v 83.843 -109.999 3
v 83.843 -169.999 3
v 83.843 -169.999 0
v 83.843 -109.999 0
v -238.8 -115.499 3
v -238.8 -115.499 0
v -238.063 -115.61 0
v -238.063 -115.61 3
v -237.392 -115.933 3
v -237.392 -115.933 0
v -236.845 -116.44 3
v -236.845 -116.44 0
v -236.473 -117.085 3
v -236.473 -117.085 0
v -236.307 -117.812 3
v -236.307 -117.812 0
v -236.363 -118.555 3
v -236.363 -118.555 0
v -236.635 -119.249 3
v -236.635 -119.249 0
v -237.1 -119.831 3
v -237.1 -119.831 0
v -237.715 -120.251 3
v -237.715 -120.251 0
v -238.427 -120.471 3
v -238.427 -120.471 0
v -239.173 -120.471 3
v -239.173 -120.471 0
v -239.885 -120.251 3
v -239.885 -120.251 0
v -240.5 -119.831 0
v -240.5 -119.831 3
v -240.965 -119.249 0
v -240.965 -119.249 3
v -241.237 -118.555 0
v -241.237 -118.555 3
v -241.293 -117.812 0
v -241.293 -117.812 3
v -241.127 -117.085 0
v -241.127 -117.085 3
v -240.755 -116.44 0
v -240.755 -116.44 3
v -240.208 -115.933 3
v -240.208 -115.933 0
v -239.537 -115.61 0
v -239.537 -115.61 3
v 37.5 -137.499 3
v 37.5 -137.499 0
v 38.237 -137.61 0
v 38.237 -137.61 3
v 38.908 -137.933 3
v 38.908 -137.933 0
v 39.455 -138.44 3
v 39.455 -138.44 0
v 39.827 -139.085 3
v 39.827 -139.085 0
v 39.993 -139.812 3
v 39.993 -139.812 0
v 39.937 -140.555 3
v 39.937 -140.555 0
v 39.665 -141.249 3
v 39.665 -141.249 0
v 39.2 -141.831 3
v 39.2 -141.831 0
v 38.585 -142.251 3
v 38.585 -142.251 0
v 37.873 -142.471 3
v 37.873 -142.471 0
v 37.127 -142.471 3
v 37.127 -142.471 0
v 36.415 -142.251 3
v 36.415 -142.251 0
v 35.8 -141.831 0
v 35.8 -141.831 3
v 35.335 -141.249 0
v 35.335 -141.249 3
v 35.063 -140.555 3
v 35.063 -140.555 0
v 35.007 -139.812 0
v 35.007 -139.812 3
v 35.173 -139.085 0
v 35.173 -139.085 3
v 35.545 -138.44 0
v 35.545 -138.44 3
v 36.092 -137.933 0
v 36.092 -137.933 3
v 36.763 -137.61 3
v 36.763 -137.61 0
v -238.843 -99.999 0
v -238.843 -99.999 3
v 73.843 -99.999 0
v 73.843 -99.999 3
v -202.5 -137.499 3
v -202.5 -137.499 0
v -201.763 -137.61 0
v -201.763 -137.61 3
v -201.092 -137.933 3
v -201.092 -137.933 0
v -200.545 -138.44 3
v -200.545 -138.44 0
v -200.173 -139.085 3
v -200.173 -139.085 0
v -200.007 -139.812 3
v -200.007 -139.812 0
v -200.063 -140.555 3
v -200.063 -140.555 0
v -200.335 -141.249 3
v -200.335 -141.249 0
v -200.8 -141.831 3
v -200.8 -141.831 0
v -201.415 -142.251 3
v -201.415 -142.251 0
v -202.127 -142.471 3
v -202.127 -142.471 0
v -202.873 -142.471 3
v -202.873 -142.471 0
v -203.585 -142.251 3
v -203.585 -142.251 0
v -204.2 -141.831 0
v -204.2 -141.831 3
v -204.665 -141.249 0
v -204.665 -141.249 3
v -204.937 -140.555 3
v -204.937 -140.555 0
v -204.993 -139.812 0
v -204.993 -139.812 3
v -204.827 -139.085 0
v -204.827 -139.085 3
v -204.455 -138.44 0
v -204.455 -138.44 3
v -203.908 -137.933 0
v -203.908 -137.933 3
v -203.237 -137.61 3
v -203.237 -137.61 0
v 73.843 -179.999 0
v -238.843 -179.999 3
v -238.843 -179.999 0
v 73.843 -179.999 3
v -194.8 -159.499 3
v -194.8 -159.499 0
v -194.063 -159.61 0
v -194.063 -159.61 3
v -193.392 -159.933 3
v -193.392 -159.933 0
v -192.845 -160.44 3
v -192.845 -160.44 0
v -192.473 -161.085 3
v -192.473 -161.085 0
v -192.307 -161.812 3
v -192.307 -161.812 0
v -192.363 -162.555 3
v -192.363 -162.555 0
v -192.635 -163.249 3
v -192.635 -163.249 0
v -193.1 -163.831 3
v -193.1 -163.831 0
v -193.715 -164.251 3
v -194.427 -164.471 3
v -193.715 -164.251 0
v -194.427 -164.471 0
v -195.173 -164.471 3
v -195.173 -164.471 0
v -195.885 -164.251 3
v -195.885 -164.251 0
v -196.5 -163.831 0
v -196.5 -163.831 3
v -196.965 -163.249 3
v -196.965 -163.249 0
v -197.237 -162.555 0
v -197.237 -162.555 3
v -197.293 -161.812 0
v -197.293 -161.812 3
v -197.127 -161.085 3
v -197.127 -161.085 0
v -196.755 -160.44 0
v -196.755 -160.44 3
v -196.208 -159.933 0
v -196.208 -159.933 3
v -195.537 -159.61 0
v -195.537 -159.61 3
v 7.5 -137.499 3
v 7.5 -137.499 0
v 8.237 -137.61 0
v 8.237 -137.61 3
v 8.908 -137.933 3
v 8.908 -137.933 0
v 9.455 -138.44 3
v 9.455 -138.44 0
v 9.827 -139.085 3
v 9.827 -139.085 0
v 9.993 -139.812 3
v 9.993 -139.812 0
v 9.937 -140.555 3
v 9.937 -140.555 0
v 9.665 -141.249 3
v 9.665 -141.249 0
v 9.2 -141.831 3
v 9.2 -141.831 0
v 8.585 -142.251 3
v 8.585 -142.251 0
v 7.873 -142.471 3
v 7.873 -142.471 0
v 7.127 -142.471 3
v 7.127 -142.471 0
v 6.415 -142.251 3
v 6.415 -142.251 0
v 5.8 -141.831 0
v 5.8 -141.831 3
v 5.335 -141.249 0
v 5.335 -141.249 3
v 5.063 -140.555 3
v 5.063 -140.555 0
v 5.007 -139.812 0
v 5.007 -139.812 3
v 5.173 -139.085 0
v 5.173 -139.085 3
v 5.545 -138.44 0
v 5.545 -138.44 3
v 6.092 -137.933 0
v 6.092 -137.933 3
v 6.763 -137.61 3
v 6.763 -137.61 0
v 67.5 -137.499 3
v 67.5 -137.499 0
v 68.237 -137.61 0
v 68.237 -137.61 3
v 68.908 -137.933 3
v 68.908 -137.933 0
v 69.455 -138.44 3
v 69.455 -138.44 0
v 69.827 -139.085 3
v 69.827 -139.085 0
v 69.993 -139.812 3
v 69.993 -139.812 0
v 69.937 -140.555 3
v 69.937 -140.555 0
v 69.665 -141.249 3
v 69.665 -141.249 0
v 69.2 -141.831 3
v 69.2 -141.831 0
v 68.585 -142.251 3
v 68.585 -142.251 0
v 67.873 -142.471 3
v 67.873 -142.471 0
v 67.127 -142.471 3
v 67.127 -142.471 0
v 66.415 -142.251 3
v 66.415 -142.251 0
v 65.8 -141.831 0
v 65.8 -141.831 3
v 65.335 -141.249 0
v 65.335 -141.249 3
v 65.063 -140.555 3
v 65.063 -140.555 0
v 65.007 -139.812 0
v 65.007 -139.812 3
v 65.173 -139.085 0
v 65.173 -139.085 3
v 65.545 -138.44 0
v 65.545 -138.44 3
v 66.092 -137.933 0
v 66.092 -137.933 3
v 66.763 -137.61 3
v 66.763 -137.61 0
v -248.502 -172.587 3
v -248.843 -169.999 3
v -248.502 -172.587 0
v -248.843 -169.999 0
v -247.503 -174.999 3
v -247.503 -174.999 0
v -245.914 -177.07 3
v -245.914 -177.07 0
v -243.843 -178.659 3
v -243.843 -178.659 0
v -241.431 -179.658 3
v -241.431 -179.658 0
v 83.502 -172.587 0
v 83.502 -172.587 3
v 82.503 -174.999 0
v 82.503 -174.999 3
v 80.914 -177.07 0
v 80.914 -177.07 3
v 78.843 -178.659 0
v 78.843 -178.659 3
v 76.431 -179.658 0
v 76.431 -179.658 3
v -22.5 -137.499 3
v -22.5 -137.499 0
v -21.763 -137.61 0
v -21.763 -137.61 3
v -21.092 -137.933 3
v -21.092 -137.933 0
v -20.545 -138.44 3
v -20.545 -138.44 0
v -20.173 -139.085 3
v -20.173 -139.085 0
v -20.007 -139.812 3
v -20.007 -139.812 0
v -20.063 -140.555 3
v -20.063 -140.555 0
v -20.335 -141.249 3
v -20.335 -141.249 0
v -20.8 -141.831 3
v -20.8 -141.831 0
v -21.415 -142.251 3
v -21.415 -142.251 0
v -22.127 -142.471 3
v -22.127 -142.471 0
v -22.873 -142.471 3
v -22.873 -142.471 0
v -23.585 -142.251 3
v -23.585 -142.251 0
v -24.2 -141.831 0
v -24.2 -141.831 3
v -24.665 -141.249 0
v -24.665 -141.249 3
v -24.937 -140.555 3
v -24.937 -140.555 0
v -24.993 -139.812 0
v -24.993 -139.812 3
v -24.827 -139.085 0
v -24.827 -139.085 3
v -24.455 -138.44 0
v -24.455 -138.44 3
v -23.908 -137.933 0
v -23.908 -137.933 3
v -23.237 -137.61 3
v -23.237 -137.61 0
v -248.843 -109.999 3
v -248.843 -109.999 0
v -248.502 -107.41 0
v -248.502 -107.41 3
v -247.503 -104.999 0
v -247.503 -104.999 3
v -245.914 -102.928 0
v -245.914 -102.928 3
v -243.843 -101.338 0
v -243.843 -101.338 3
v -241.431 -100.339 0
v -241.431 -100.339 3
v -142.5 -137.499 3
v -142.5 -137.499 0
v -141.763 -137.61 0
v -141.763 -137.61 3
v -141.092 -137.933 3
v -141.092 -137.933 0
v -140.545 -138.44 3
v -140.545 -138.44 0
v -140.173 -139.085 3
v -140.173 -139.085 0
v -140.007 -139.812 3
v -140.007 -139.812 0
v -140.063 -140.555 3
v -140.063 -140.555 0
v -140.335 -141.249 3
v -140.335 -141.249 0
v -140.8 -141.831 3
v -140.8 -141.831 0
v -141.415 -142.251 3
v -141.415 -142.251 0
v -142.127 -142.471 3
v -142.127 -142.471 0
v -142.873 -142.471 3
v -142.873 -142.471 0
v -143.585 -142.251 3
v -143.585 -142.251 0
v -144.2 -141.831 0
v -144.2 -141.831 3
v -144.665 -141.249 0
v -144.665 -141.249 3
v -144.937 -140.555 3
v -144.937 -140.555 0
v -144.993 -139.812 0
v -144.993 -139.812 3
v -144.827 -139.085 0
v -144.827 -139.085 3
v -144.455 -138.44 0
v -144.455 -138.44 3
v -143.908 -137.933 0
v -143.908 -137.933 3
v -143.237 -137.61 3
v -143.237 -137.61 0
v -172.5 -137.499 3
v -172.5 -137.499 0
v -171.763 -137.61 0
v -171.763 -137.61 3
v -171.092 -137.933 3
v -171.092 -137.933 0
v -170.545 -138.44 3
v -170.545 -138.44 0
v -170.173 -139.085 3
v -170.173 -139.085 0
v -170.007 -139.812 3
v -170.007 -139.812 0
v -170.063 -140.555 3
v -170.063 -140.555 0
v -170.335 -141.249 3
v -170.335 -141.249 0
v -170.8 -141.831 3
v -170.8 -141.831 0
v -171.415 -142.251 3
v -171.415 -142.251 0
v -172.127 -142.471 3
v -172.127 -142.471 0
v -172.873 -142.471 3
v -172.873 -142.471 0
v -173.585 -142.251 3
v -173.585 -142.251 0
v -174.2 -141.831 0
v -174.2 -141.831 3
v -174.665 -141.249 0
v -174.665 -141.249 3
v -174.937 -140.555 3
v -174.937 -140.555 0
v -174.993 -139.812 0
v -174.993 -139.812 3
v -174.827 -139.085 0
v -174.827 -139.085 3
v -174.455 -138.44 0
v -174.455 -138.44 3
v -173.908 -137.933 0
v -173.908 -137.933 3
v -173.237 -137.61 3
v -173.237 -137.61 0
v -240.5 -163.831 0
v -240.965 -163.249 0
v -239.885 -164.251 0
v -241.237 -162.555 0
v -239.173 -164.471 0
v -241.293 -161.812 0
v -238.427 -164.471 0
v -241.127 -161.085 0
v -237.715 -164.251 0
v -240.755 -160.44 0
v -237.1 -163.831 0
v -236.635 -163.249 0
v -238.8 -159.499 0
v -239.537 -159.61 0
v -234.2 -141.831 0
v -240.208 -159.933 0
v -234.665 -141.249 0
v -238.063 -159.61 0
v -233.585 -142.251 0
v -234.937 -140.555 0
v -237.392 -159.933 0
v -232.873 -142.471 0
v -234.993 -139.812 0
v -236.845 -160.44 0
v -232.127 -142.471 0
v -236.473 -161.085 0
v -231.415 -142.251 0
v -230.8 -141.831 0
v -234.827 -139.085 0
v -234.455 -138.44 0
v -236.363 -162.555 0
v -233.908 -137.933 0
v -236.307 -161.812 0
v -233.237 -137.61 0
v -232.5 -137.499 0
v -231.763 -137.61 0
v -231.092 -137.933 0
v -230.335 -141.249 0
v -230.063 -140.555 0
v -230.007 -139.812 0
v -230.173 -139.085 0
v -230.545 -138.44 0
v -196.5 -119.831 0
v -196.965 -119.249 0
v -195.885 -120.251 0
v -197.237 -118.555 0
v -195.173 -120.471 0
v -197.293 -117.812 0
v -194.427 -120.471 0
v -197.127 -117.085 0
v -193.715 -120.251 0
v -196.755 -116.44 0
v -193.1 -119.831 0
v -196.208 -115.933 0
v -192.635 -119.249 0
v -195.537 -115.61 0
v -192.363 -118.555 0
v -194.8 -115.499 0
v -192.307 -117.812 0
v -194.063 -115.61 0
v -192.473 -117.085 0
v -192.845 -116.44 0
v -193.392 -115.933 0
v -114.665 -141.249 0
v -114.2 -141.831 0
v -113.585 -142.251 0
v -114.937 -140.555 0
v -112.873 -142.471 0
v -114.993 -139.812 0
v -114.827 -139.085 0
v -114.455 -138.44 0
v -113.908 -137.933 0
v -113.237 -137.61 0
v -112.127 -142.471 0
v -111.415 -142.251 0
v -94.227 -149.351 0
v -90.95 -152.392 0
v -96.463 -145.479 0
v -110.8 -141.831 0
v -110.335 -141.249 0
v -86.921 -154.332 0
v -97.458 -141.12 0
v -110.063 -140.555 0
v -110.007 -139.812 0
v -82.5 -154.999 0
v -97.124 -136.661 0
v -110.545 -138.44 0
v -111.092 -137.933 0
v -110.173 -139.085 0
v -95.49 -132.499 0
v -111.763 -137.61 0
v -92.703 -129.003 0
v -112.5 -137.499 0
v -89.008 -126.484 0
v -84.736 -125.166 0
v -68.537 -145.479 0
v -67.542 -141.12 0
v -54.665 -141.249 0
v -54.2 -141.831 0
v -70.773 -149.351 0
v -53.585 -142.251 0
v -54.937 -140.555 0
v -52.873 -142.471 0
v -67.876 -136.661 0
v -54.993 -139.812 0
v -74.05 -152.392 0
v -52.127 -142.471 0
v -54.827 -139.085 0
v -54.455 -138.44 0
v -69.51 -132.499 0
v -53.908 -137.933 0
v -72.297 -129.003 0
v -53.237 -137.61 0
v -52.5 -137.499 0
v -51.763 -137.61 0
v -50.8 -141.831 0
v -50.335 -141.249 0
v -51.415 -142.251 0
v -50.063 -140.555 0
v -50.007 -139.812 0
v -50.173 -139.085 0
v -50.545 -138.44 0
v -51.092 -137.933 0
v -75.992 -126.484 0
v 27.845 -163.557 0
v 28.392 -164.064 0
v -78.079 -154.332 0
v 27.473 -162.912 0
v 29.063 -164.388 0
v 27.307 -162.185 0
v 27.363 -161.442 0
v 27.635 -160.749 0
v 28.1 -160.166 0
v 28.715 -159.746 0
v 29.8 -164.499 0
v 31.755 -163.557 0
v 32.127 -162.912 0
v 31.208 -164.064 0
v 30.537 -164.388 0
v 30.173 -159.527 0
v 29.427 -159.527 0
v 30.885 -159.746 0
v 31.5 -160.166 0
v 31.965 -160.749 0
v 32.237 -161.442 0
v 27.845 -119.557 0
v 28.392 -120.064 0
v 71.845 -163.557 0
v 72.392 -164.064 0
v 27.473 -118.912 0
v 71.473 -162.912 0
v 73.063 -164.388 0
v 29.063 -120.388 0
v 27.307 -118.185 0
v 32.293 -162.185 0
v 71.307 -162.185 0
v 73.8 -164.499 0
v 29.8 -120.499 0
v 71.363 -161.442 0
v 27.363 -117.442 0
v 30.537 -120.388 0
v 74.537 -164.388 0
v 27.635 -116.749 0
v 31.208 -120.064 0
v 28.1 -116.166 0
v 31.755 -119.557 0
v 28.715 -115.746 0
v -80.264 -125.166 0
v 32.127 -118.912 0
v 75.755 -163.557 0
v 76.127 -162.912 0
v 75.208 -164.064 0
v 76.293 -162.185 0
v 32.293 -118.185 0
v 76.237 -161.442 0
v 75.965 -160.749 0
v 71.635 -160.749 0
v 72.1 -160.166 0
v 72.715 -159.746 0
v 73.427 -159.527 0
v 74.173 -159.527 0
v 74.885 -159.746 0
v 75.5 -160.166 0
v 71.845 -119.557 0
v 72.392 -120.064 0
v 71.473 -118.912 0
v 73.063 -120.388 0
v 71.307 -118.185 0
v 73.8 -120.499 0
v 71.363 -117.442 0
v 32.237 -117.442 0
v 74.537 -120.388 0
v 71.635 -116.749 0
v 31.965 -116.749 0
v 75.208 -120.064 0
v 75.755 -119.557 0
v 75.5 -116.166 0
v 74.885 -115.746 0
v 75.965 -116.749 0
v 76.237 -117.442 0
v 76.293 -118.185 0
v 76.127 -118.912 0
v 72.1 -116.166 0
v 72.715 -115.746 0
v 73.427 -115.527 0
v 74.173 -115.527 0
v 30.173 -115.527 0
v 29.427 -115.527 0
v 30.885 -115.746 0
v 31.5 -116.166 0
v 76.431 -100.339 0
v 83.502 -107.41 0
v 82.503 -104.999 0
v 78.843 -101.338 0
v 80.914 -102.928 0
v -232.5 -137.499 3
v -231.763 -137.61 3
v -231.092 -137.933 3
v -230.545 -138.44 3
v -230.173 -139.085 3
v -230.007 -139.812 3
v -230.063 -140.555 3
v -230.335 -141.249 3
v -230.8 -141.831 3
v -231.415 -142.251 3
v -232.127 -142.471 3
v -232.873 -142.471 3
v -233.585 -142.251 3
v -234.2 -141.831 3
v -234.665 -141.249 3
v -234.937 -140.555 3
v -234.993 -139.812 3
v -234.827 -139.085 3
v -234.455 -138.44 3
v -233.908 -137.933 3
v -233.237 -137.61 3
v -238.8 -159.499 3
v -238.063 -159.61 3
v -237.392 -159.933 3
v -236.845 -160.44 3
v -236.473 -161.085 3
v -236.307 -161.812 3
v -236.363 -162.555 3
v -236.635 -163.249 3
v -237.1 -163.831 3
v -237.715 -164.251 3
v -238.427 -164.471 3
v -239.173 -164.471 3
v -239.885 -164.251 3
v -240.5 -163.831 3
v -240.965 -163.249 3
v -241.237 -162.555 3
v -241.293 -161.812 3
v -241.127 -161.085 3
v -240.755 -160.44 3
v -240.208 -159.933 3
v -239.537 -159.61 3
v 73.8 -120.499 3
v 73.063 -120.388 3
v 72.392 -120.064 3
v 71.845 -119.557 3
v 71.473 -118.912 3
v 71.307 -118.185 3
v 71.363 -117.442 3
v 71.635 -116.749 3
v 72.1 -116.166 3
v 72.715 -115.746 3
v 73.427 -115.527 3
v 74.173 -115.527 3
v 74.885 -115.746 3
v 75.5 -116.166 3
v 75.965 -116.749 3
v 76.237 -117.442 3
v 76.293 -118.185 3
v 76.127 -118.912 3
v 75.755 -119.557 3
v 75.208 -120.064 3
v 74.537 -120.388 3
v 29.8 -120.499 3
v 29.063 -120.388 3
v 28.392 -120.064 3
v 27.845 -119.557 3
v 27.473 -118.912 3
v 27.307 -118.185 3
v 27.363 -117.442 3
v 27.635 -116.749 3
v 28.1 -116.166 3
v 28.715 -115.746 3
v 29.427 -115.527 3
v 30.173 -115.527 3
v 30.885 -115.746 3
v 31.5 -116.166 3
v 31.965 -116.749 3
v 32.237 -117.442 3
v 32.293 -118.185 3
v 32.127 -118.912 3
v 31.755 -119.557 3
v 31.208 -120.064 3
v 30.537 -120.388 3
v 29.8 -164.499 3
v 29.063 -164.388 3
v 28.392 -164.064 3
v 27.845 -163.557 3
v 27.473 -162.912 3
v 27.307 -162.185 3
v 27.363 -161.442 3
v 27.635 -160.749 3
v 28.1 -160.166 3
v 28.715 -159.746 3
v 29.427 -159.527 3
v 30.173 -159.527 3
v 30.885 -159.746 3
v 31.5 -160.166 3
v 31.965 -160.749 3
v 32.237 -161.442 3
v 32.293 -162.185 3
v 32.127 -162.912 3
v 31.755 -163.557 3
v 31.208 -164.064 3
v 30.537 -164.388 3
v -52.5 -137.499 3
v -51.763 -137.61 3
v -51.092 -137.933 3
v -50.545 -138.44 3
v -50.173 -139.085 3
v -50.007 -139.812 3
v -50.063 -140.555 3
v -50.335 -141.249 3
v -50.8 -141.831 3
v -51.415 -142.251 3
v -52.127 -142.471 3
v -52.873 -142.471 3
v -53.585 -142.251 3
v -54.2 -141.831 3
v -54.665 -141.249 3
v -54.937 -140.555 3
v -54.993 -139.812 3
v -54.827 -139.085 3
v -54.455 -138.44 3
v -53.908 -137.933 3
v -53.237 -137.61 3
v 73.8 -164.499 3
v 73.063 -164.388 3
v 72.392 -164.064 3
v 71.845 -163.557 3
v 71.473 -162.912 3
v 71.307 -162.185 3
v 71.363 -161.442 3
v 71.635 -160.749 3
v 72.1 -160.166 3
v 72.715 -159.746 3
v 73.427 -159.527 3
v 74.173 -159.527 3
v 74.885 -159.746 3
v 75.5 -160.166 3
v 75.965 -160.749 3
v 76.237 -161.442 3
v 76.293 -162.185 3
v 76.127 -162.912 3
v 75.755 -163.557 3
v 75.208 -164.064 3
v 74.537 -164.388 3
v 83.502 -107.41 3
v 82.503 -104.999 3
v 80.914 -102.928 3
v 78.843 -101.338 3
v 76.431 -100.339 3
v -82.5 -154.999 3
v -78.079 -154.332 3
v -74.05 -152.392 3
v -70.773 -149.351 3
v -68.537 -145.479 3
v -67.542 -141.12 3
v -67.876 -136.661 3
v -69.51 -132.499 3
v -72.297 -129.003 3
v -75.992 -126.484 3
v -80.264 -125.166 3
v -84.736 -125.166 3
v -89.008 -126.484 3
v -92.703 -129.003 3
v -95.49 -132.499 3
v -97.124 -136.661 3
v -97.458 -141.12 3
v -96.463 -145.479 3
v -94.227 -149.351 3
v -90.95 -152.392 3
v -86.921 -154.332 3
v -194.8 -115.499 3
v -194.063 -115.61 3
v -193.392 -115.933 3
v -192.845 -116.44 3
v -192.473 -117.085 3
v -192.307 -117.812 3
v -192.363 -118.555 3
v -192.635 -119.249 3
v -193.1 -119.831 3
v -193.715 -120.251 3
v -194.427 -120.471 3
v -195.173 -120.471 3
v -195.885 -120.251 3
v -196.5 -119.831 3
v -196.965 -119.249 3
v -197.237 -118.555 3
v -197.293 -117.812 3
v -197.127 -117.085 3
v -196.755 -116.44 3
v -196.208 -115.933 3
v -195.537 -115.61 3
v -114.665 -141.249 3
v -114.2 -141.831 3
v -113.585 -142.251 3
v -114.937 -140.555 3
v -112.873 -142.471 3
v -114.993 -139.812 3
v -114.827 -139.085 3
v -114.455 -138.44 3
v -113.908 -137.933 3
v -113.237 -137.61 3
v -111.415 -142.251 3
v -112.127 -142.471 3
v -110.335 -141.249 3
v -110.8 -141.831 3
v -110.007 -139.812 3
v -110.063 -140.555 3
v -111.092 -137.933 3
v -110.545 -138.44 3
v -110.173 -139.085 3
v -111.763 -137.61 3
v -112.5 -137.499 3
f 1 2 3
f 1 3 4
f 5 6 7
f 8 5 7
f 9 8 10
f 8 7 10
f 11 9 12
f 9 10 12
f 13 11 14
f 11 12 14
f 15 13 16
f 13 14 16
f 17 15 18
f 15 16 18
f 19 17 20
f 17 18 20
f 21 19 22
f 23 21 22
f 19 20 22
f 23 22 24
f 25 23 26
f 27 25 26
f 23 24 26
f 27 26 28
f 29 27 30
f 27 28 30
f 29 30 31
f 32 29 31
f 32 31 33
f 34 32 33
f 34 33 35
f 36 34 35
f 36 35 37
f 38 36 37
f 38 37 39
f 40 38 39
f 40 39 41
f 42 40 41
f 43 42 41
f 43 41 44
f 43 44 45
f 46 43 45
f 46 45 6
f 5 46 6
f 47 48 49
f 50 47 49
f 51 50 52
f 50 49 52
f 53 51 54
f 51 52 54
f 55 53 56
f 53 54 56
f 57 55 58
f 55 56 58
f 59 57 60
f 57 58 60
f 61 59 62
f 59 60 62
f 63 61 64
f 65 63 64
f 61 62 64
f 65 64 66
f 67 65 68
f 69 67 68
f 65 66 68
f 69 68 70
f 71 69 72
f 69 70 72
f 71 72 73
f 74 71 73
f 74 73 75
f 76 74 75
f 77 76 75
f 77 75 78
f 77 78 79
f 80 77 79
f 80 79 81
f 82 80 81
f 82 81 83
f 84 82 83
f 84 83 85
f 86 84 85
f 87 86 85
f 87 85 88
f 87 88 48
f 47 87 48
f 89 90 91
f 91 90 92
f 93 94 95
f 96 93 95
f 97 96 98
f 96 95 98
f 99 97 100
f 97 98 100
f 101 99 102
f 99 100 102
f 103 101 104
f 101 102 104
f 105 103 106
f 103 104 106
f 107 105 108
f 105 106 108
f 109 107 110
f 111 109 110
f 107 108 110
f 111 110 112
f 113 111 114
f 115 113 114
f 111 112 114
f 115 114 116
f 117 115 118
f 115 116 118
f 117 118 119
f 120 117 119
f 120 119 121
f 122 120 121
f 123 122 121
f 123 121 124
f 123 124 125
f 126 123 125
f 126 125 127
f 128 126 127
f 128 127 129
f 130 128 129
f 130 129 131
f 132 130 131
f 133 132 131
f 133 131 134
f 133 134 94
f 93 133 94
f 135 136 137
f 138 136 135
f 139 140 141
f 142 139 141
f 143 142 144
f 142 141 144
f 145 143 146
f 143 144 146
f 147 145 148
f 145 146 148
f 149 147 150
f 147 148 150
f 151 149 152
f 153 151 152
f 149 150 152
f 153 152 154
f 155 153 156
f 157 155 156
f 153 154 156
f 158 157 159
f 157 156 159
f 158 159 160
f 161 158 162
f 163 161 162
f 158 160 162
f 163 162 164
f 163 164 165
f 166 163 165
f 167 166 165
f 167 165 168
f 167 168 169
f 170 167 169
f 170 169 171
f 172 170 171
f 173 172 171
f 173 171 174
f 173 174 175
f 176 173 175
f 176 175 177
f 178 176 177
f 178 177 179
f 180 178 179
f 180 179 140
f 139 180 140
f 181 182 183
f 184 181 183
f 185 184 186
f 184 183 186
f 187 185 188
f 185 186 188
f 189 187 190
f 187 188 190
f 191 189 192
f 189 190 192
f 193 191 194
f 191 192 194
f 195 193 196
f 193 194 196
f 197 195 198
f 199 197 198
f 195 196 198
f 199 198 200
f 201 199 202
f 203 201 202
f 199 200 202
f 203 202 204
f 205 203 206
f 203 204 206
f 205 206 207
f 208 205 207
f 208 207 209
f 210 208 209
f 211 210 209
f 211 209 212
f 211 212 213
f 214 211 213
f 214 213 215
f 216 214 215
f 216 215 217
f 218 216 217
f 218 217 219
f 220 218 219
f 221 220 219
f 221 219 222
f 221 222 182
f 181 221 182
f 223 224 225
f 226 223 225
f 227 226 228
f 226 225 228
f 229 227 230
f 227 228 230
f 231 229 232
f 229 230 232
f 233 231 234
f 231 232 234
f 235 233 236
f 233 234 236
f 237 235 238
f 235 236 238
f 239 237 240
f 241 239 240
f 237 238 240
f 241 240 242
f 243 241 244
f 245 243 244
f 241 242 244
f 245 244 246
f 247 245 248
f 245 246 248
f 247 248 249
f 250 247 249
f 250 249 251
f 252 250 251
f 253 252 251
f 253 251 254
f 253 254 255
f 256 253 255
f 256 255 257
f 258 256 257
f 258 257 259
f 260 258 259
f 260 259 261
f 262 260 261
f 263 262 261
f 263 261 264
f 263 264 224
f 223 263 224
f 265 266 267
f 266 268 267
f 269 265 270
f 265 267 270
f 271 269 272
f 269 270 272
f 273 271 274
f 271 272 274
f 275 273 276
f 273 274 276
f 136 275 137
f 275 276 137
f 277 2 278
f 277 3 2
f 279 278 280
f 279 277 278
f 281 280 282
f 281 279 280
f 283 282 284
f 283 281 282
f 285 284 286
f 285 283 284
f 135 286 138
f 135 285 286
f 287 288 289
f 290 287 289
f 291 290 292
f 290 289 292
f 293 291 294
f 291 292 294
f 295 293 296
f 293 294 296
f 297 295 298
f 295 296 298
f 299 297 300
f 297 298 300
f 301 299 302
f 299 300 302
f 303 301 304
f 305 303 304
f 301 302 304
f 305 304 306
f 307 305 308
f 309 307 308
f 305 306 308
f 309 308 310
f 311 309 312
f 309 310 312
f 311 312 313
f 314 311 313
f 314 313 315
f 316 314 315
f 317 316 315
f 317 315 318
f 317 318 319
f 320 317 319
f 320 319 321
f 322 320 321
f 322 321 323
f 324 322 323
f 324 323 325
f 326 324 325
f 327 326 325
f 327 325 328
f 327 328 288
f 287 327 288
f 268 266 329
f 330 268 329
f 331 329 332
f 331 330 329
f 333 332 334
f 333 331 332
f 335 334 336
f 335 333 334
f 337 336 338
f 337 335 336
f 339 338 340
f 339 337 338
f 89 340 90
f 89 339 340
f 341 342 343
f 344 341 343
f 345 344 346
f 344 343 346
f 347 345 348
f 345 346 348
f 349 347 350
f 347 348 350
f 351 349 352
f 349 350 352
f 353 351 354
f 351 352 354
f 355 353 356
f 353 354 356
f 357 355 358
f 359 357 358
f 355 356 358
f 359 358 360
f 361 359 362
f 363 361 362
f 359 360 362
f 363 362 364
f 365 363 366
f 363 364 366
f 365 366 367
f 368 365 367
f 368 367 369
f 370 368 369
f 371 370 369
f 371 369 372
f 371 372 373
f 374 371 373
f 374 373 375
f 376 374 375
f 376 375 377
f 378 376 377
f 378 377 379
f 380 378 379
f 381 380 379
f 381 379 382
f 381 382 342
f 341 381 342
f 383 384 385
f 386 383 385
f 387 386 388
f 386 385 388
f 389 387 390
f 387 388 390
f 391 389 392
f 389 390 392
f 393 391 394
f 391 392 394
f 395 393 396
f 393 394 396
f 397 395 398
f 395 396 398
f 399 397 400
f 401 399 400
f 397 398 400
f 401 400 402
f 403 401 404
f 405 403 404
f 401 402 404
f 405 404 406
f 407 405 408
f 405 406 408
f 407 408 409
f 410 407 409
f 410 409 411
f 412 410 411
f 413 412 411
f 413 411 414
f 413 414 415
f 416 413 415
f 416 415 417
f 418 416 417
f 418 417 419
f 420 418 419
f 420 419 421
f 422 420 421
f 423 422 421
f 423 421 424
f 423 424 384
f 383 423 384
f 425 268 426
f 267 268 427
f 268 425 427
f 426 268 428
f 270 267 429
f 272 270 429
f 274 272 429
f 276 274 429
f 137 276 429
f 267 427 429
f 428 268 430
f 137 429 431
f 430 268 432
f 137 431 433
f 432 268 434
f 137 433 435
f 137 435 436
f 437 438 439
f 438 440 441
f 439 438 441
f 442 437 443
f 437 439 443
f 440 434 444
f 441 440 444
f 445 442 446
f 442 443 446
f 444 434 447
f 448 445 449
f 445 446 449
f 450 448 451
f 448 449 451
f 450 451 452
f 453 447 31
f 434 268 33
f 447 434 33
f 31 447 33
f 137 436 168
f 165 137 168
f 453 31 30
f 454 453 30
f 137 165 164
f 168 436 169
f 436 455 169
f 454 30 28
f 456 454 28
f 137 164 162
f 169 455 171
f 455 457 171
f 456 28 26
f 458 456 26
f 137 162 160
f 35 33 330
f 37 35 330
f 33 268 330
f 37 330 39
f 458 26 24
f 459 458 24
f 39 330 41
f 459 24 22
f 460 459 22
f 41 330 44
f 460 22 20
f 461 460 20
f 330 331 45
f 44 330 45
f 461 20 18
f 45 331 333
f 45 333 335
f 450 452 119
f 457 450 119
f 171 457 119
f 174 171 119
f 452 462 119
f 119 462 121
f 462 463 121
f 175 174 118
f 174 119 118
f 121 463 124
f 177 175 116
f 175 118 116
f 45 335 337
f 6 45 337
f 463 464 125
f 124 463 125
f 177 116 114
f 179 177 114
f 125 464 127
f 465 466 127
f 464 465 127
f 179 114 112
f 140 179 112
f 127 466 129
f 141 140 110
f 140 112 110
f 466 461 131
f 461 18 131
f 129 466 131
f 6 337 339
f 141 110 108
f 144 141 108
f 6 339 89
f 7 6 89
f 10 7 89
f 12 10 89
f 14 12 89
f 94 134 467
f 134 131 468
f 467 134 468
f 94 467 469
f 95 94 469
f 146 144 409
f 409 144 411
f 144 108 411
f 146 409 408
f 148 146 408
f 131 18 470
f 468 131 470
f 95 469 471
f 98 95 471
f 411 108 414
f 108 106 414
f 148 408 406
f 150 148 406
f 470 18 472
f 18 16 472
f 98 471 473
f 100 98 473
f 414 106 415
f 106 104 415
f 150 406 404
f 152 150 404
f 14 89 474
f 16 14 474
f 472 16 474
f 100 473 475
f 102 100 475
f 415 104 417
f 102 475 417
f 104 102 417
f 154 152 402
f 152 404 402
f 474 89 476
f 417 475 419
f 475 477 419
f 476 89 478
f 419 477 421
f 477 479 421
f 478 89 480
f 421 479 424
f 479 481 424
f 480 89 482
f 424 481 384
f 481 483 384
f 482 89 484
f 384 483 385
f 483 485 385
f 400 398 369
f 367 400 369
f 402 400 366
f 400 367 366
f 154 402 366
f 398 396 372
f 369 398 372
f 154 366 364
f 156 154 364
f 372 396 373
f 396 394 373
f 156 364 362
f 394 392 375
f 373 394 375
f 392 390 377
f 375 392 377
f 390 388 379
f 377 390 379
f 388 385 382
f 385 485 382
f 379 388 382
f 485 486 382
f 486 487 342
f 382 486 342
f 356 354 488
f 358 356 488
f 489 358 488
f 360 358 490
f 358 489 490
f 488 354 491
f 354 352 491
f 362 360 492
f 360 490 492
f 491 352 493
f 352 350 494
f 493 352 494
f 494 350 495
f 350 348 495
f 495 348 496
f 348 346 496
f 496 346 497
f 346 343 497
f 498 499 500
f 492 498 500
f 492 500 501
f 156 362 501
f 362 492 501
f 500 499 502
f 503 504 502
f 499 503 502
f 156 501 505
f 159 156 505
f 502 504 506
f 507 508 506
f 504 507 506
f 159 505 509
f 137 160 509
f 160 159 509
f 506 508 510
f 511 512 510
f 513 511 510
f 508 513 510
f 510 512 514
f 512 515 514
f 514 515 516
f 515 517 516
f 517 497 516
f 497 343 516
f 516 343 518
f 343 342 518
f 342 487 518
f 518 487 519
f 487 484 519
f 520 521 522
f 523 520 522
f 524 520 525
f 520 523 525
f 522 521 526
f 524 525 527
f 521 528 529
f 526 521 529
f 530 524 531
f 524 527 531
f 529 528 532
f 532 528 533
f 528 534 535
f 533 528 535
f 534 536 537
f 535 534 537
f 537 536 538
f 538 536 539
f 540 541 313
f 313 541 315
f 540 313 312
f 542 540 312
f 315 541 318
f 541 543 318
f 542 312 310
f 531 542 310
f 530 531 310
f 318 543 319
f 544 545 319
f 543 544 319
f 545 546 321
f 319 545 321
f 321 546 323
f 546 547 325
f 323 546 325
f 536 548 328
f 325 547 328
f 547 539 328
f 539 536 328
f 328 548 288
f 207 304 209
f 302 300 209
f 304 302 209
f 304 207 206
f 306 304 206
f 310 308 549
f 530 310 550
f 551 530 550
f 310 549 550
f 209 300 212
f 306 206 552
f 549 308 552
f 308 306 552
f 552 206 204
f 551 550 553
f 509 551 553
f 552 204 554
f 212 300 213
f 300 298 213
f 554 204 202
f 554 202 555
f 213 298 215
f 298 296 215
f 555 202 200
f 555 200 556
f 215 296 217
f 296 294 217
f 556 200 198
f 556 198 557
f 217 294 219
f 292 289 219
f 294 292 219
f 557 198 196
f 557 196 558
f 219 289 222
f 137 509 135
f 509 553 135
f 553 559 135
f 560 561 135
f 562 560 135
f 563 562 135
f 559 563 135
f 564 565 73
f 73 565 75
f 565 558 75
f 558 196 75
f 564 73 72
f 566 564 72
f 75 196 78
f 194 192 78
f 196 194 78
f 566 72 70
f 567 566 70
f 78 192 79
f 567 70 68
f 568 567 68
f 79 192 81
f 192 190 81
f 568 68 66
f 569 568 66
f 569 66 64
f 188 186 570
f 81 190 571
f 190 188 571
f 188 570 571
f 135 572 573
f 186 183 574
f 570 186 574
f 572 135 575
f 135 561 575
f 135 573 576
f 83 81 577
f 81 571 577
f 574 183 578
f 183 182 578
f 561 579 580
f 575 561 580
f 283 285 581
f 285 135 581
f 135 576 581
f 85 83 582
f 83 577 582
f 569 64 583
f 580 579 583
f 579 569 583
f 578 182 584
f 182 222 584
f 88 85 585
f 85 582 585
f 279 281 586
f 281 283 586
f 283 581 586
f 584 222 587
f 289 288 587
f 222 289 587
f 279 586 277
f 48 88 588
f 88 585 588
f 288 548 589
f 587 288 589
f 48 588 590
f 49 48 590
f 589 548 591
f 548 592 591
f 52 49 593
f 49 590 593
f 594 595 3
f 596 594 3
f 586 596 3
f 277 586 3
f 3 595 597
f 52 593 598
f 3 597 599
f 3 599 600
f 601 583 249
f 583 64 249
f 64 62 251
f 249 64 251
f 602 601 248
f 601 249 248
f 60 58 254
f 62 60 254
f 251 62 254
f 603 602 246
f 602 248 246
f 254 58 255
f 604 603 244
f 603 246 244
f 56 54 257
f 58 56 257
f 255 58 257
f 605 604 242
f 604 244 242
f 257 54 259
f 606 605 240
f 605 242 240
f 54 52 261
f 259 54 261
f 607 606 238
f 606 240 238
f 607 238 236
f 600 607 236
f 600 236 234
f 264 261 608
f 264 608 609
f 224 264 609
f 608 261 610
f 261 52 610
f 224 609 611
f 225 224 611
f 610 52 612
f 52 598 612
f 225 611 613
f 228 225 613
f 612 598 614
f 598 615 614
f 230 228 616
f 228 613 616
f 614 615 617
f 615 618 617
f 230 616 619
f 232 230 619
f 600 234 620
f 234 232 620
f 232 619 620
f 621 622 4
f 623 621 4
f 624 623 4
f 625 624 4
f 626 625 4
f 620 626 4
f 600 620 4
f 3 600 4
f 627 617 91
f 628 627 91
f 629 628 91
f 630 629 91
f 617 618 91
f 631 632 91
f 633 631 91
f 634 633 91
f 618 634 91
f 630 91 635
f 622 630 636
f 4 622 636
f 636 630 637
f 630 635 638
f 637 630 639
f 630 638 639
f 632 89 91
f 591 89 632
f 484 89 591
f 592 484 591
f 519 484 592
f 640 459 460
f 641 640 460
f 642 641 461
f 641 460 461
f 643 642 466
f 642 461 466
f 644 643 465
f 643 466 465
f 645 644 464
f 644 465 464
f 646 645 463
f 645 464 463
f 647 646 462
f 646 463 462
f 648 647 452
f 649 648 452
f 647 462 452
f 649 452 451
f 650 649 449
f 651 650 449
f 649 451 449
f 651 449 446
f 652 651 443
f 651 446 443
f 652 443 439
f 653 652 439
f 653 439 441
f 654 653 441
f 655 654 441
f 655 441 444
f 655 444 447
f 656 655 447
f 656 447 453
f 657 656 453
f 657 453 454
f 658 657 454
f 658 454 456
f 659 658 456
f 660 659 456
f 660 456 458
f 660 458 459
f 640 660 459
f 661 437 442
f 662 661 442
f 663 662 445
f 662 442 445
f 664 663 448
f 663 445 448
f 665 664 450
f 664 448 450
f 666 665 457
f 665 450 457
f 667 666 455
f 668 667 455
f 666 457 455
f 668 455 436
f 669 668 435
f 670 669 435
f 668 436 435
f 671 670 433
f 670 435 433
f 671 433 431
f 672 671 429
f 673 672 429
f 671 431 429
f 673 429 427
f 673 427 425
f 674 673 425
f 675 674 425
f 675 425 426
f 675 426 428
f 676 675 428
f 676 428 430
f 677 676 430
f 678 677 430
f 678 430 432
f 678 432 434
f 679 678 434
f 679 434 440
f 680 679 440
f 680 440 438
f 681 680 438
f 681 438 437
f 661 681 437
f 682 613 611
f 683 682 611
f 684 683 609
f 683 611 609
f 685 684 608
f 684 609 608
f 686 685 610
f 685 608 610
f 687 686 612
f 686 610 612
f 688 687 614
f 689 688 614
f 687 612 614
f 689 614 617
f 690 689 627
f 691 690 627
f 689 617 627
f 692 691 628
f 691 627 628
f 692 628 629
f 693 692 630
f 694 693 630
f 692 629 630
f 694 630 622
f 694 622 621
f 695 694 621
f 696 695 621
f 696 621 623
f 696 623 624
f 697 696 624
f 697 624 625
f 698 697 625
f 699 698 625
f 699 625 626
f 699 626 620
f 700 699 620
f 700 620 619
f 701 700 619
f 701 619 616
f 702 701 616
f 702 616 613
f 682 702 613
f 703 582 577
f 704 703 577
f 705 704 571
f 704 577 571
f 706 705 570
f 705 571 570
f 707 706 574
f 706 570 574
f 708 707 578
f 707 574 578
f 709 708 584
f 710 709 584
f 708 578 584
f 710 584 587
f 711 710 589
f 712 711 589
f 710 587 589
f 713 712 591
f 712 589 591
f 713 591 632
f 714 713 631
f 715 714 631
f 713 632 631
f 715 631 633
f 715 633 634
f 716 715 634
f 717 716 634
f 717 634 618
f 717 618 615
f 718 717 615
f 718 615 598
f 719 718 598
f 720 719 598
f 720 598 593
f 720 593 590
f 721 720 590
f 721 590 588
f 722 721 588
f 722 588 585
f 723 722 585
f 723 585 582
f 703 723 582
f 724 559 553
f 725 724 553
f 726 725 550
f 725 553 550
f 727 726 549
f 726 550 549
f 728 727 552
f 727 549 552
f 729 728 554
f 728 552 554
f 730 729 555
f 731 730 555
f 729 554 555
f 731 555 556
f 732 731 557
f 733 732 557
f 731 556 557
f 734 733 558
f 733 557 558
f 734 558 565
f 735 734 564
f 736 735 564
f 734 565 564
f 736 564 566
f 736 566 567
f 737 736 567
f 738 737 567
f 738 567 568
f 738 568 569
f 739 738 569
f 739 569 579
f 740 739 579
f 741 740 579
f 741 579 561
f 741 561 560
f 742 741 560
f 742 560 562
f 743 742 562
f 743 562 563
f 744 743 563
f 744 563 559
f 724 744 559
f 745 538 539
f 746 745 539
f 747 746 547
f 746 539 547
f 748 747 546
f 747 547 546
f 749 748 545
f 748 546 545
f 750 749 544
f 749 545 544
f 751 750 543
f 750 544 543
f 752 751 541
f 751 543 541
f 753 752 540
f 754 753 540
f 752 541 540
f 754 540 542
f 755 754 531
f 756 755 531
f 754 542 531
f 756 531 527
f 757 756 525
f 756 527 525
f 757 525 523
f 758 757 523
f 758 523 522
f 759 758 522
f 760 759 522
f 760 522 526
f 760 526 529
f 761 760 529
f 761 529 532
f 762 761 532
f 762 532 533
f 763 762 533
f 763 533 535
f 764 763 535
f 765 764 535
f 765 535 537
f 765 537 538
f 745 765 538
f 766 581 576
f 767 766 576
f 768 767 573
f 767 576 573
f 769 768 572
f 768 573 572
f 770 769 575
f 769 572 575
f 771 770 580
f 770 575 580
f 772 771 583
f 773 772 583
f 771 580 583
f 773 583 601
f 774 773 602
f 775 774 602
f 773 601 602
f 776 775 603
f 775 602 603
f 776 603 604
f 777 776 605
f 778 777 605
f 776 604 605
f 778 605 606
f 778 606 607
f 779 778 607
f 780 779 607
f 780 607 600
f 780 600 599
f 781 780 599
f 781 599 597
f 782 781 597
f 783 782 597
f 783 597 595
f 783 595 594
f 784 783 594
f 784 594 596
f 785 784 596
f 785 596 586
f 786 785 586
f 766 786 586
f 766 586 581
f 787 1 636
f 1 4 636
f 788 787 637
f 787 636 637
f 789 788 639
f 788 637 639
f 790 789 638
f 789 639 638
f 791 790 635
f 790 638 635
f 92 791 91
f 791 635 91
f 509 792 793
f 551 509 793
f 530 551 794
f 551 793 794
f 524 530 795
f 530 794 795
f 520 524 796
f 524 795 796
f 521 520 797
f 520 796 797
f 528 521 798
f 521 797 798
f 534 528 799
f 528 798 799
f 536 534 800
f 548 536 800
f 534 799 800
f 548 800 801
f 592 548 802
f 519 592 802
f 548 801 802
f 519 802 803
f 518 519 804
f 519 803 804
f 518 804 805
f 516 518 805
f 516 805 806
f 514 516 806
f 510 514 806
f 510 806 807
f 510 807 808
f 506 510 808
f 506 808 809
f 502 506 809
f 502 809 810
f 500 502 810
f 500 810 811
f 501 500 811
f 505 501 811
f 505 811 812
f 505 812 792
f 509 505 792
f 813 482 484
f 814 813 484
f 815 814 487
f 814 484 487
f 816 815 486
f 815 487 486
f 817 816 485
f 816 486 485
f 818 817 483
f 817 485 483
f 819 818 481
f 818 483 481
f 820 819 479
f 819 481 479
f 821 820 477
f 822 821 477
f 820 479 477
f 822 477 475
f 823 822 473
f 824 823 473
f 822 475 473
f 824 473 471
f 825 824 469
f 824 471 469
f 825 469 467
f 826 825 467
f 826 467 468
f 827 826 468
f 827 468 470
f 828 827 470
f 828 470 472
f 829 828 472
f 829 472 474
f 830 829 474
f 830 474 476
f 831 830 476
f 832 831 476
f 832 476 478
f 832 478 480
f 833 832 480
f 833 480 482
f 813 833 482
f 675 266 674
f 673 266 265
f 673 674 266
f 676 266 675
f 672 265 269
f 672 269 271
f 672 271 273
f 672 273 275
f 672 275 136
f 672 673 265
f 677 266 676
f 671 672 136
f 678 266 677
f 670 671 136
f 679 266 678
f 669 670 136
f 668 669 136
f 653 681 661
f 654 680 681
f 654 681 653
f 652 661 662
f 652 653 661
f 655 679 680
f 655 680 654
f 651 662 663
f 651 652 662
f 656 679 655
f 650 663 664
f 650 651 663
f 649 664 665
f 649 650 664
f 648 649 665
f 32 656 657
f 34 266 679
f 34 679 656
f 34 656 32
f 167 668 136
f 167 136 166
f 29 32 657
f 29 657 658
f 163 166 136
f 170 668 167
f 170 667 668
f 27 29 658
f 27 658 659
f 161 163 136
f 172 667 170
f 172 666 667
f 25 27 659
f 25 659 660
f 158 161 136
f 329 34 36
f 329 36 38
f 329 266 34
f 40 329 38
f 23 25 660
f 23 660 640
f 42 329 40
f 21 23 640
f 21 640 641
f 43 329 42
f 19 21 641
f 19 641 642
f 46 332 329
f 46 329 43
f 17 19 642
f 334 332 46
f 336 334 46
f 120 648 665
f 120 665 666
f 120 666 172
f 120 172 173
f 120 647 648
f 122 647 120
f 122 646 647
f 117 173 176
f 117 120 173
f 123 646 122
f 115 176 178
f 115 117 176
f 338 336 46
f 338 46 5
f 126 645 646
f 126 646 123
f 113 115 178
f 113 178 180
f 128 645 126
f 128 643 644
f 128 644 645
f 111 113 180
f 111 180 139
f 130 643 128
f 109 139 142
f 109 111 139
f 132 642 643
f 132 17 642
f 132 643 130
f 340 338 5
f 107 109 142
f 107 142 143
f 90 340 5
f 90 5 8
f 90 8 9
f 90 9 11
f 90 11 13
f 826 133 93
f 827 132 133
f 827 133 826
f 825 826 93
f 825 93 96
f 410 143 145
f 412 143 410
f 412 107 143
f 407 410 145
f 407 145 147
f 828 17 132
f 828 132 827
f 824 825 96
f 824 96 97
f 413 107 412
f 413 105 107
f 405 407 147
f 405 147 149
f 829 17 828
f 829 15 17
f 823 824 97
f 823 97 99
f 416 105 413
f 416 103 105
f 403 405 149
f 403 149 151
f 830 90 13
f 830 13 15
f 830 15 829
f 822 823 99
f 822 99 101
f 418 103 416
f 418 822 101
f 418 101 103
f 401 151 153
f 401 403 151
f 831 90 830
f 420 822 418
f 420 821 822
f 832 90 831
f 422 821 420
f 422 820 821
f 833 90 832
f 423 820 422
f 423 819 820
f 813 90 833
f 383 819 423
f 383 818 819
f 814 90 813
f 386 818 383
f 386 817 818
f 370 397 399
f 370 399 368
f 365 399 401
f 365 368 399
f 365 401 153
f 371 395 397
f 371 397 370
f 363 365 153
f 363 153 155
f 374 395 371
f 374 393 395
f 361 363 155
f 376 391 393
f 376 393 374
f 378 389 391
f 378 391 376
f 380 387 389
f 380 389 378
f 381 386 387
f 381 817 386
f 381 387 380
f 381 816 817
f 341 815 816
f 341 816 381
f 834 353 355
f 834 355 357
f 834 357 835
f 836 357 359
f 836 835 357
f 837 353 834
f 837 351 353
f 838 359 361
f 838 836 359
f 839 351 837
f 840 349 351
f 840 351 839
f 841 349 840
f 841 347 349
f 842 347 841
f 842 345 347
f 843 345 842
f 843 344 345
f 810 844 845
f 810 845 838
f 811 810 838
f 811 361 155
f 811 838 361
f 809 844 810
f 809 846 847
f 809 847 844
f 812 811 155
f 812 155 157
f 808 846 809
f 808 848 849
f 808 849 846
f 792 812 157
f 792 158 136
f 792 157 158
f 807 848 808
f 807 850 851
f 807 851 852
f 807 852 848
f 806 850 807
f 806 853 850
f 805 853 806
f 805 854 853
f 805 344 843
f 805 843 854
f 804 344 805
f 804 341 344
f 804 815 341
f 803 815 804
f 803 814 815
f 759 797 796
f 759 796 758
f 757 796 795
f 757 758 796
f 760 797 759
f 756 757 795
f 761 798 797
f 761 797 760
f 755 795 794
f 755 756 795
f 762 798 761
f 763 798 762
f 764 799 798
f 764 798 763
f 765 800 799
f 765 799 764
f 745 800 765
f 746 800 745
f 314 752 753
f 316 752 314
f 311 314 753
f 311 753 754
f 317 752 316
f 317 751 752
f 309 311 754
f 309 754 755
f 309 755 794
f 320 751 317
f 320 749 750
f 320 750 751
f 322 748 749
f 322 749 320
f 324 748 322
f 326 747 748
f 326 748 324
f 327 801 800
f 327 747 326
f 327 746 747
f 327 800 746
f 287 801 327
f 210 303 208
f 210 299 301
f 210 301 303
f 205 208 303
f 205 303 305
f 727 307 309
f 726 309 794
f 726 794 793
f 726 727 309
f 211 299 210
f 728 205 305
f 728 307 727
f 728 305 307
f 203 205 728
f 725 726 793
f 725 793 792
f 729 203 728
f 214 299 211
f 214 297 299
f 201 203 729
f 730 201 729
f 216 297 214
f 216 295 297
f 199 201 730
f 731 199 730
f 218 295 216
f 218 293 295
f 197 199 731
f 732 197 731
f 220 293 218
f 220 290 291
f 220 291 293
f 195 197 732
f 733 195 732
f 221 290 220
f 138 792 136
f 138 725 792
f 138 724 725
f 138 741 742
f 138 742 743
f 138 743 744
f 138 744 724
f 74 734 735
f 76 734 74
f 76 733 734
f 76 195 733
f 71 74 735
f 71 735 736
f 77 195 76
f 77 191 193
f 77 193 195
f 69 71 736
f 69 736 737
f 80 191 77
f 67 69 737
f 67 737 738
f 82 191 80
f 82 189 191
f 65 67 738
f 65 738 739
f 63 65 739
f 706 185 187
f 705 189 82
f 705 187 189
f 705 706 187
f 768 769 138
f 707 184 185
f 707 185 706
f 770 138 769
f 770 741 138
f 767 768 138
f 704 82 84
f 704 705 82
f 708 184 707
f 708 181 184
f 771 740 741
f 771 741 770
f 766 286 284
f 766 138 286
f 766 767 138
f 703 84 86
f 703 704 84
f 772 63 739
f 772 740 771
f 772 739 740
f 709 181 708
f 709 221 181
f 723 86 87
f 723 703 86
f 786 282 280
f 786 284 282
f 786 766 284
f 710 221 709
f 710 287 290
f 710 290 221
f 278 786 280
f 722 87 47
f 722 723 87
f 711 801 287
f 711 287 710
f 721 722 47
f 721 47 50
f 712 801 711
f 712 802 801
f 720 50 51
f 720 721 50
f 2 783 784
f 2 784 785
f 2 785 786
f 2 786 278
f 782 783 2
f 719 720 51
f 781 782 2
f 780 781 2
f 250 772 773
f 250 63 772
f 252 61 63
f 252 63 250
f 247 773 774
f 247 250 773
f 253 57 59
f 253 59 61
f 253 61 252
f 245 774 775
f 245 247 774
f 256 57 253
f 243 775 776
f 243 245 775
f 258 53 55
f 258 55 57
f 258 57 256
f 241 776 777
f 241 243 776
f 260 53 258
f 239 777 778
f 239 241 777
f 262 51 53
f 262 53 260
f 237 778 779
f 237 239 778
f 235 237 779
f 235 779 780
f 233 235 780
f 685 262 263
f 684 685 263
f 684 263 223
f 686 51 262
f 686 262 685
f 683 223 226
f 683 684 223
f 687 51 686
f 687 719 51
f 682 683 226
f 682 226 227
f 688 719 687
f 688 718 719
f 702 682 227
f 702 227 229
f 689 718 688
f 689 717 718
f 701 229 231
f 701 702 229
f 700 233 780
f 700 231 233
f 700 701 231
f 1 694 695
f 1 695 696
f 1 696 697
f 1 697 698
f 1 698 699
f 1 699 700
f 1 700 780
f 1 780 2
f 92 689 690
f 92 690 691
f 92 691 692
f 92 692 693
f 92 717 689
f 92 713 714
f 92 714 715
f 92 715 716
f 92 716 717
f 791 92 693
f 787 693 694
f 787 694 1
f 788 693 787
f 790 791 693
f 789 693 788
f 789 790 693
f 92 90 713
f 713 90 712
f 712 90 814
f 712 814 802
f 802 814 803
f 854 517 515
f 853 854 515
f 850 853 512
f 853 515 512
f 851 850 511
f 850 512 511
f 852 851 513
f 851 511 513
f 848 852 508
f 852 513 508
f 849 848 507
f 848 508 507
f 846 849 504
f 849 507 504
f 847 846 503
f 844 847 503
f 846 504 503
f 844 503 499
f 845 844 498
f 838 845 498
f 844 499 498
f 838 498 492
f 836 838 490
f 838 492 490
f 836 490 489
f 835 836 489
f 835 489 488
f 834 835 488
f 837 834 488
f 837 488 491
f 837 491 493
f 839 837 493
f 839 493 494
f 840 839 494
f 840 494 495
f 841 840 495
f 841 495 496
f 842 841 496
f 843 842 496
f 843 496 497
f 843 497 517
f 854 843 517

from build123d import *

# Parameters (mm, degrees)
SKETCH_2_W          = 332.68587988
SKETCH_2_H          = 71.0001569
EXTRUDE_1_DEPTH     = 3
SKETCH_6_R          = 15
CUT_EXTRUDE_1_DEPTH = 10
SKETCH_7_R          = 2.5
CUT_EXTRUDE_2_DEPTH = 10
SKETCH_8_W          = 332.68587988
SKETCH_8_H          = 4.49992155
EXTRUDE_2_DEPTH     = 3
FILLET_1_R          = 10
SKETCH_9_R          = 2.5
CUT_EXTRUDE_3_DEPTH = 308.13402677


with BuildPart() as part:
    # 草图2 → 凸台-拉伸1 (new body)
    with BuildSketch(Plane(origin=(0, 0, 0), x_dir=(1, 0, 0), z_dir=(0, -2.59377104206923e-08, 0.9999999999999998))):
        with Locations((-82.5, -139.998615632)):
            Rectangle(SKETCH_2_W, SKETCH_2_H)
    extrude(amount=EXTRUDE_1_DEPTH)

    # 草图6 → 切除-拉伸1 (cut)
    with BuildSketch(Plane(origin=(0, -7.8e-08, 3), x_dir=(1, 0, 0), z_dir=(0, -2.5937710420692294e-08, 0.9999999999999998))):
        with Locations(Location((-82.5, -139.998615632, 0), (0, 0, 270))):
            Circle(SKETCH_6_R)
    extrude(amount=-CUT_EXTRUDE_1_DEPTH, mode=Mode.SUBTRACT)

    # 草图7 → 切除-拉伸2 (cut)
    with BuildSketch(Plane(origin=(0, 0, 0), x_dir=(-1, 0, 0), z_dir=(0, 2.5937710420692294e-08, -0.9999999999999998))):
        with Locations(Location((238.799997941, -117.998615632, 0), (0, 0, 90))):
            Circle(SKETCH_7_R)
        with Locations(Location((194.799997941, -117.998615632, 0), (0, 0, 90))):
            Circle(SKETCH_7_R)
        with Locations(Location((194.79999794, -161.998615632, 0), (0, 0, 90))):
            Circle(SKETCH_7_R)
        with Locations(Location((238.799997941, -161.998615632, 0), (0, 0, 90))):
            Circle(SKETCH_7_R)
        with Locations(Location((-73.79999794, -161.998615632, 0), (0, 0, 270))):
            Circle(SKETCH_7_R)
        with Locations(Location((-29.79999794, -161.998615632, 0), (0, 0, 270))):
            Circle(SKETCH_7_R)
        with Locations(Location((-29.79999794, -117.998615632, 0), (0, 0, 270))):
            Circle(SKETCH_7_R)
        with Locations(Location((-73.79999794, -117.998615632, 0), (0, 0, 270))):
            Circle(SKETCH_7_R)
    extrude(amount=-CUT_EXTRUDE_2_DEPTH, mode=Mode.SUBTRACT)

    # 草图8 → 凸台-拉伸2 (add)
    with BuildSketch(Plane(origin=(0, -7.8e-08, 3), x_dir=(1, 0, 0), z_dir=(0, -2.5937710420692294e-08, 0.9999999999999998))):
        with Locations((-82.5, -102.248576407)):
            Rectangle(SKETCH_8_W, SKETCH_8_H)
        with Locations((-82.5, -177.748654857)):
            Rectangle(SKETCH_8_W, SKETCH_8_H)
    extrude(amount=-EXTRUDE_2_DEPTH)

    # 圆角1
    fillet_1_edges = [part.edges().sort_by_distance(p)[0] for p in [
        (-248.84293994, -99.998615671, 1.499997406),
        (83.84293994, -99.998615671, 1.499997406),
        (83.84293994, -179.998615671, 1.499995331),
        (-248.84293994, -179.998615671, 1.499995331),
    ]]
    fillet(fillet_1_edges, radius=FILLET_1_R)

    # 草图9 → 切除-拉伸3 (cut, through all)
    with BuildSketch(Plane(origin=(0, 0, 0), x_dir=(-1, 0, 0), z_dir=(0, 2.5937710420692294e-08, -0.9999999999999998))):
        with Locations(Location((202.5, -139.998615632, 0), (0, 0, 90))):
            Circle(SKETCH_9_R)
        with Locations(Location((172.5, -139.998615632, 0), (0, 0, 90))):
            Circle(SKETCH_9_R)
        with Locations(Location((142.5, -139.998615632, 0), (0, 0, 90))):
            Circle(SKETCH_9_R)
        with Locations(Location((112.5, -139.998615632, 0), (0, 0, 90))):
            Circle(SKETCH_9_R)
        with Locations(Location((52.5, -139.998615632, 0), (0, 0, 90))):
            Circle(SKETCH_9_R)
        with Locations(Location((22.5, -139.998615632, 0), (0, 0, 90))):
            Circle(SKETCH_9_R)
        with Locations(Location((-7.5, -139.998615632, 0), (0, 0, 90))):
            Circle(SKETCH_9_R)
        with Locations(Location((-37.5, -139.998615632, 0), (0, 0, 90))):
            Circle(SKETCH_9_R)
        with Locations(Location((-67.5, -139.998615632, 0), (0, 0, 90))):
            Circle(SKETCH_9_R)
        with Locations(Location((232.5, -139.998615632, 0), (0, 0, 90))):
            Circle(SKETCH_9_R)
    extrude(amount=-CUT_EXTRUDE_3_DEPTH, mode=Mode.SUBTRACT)


solid = part.part
